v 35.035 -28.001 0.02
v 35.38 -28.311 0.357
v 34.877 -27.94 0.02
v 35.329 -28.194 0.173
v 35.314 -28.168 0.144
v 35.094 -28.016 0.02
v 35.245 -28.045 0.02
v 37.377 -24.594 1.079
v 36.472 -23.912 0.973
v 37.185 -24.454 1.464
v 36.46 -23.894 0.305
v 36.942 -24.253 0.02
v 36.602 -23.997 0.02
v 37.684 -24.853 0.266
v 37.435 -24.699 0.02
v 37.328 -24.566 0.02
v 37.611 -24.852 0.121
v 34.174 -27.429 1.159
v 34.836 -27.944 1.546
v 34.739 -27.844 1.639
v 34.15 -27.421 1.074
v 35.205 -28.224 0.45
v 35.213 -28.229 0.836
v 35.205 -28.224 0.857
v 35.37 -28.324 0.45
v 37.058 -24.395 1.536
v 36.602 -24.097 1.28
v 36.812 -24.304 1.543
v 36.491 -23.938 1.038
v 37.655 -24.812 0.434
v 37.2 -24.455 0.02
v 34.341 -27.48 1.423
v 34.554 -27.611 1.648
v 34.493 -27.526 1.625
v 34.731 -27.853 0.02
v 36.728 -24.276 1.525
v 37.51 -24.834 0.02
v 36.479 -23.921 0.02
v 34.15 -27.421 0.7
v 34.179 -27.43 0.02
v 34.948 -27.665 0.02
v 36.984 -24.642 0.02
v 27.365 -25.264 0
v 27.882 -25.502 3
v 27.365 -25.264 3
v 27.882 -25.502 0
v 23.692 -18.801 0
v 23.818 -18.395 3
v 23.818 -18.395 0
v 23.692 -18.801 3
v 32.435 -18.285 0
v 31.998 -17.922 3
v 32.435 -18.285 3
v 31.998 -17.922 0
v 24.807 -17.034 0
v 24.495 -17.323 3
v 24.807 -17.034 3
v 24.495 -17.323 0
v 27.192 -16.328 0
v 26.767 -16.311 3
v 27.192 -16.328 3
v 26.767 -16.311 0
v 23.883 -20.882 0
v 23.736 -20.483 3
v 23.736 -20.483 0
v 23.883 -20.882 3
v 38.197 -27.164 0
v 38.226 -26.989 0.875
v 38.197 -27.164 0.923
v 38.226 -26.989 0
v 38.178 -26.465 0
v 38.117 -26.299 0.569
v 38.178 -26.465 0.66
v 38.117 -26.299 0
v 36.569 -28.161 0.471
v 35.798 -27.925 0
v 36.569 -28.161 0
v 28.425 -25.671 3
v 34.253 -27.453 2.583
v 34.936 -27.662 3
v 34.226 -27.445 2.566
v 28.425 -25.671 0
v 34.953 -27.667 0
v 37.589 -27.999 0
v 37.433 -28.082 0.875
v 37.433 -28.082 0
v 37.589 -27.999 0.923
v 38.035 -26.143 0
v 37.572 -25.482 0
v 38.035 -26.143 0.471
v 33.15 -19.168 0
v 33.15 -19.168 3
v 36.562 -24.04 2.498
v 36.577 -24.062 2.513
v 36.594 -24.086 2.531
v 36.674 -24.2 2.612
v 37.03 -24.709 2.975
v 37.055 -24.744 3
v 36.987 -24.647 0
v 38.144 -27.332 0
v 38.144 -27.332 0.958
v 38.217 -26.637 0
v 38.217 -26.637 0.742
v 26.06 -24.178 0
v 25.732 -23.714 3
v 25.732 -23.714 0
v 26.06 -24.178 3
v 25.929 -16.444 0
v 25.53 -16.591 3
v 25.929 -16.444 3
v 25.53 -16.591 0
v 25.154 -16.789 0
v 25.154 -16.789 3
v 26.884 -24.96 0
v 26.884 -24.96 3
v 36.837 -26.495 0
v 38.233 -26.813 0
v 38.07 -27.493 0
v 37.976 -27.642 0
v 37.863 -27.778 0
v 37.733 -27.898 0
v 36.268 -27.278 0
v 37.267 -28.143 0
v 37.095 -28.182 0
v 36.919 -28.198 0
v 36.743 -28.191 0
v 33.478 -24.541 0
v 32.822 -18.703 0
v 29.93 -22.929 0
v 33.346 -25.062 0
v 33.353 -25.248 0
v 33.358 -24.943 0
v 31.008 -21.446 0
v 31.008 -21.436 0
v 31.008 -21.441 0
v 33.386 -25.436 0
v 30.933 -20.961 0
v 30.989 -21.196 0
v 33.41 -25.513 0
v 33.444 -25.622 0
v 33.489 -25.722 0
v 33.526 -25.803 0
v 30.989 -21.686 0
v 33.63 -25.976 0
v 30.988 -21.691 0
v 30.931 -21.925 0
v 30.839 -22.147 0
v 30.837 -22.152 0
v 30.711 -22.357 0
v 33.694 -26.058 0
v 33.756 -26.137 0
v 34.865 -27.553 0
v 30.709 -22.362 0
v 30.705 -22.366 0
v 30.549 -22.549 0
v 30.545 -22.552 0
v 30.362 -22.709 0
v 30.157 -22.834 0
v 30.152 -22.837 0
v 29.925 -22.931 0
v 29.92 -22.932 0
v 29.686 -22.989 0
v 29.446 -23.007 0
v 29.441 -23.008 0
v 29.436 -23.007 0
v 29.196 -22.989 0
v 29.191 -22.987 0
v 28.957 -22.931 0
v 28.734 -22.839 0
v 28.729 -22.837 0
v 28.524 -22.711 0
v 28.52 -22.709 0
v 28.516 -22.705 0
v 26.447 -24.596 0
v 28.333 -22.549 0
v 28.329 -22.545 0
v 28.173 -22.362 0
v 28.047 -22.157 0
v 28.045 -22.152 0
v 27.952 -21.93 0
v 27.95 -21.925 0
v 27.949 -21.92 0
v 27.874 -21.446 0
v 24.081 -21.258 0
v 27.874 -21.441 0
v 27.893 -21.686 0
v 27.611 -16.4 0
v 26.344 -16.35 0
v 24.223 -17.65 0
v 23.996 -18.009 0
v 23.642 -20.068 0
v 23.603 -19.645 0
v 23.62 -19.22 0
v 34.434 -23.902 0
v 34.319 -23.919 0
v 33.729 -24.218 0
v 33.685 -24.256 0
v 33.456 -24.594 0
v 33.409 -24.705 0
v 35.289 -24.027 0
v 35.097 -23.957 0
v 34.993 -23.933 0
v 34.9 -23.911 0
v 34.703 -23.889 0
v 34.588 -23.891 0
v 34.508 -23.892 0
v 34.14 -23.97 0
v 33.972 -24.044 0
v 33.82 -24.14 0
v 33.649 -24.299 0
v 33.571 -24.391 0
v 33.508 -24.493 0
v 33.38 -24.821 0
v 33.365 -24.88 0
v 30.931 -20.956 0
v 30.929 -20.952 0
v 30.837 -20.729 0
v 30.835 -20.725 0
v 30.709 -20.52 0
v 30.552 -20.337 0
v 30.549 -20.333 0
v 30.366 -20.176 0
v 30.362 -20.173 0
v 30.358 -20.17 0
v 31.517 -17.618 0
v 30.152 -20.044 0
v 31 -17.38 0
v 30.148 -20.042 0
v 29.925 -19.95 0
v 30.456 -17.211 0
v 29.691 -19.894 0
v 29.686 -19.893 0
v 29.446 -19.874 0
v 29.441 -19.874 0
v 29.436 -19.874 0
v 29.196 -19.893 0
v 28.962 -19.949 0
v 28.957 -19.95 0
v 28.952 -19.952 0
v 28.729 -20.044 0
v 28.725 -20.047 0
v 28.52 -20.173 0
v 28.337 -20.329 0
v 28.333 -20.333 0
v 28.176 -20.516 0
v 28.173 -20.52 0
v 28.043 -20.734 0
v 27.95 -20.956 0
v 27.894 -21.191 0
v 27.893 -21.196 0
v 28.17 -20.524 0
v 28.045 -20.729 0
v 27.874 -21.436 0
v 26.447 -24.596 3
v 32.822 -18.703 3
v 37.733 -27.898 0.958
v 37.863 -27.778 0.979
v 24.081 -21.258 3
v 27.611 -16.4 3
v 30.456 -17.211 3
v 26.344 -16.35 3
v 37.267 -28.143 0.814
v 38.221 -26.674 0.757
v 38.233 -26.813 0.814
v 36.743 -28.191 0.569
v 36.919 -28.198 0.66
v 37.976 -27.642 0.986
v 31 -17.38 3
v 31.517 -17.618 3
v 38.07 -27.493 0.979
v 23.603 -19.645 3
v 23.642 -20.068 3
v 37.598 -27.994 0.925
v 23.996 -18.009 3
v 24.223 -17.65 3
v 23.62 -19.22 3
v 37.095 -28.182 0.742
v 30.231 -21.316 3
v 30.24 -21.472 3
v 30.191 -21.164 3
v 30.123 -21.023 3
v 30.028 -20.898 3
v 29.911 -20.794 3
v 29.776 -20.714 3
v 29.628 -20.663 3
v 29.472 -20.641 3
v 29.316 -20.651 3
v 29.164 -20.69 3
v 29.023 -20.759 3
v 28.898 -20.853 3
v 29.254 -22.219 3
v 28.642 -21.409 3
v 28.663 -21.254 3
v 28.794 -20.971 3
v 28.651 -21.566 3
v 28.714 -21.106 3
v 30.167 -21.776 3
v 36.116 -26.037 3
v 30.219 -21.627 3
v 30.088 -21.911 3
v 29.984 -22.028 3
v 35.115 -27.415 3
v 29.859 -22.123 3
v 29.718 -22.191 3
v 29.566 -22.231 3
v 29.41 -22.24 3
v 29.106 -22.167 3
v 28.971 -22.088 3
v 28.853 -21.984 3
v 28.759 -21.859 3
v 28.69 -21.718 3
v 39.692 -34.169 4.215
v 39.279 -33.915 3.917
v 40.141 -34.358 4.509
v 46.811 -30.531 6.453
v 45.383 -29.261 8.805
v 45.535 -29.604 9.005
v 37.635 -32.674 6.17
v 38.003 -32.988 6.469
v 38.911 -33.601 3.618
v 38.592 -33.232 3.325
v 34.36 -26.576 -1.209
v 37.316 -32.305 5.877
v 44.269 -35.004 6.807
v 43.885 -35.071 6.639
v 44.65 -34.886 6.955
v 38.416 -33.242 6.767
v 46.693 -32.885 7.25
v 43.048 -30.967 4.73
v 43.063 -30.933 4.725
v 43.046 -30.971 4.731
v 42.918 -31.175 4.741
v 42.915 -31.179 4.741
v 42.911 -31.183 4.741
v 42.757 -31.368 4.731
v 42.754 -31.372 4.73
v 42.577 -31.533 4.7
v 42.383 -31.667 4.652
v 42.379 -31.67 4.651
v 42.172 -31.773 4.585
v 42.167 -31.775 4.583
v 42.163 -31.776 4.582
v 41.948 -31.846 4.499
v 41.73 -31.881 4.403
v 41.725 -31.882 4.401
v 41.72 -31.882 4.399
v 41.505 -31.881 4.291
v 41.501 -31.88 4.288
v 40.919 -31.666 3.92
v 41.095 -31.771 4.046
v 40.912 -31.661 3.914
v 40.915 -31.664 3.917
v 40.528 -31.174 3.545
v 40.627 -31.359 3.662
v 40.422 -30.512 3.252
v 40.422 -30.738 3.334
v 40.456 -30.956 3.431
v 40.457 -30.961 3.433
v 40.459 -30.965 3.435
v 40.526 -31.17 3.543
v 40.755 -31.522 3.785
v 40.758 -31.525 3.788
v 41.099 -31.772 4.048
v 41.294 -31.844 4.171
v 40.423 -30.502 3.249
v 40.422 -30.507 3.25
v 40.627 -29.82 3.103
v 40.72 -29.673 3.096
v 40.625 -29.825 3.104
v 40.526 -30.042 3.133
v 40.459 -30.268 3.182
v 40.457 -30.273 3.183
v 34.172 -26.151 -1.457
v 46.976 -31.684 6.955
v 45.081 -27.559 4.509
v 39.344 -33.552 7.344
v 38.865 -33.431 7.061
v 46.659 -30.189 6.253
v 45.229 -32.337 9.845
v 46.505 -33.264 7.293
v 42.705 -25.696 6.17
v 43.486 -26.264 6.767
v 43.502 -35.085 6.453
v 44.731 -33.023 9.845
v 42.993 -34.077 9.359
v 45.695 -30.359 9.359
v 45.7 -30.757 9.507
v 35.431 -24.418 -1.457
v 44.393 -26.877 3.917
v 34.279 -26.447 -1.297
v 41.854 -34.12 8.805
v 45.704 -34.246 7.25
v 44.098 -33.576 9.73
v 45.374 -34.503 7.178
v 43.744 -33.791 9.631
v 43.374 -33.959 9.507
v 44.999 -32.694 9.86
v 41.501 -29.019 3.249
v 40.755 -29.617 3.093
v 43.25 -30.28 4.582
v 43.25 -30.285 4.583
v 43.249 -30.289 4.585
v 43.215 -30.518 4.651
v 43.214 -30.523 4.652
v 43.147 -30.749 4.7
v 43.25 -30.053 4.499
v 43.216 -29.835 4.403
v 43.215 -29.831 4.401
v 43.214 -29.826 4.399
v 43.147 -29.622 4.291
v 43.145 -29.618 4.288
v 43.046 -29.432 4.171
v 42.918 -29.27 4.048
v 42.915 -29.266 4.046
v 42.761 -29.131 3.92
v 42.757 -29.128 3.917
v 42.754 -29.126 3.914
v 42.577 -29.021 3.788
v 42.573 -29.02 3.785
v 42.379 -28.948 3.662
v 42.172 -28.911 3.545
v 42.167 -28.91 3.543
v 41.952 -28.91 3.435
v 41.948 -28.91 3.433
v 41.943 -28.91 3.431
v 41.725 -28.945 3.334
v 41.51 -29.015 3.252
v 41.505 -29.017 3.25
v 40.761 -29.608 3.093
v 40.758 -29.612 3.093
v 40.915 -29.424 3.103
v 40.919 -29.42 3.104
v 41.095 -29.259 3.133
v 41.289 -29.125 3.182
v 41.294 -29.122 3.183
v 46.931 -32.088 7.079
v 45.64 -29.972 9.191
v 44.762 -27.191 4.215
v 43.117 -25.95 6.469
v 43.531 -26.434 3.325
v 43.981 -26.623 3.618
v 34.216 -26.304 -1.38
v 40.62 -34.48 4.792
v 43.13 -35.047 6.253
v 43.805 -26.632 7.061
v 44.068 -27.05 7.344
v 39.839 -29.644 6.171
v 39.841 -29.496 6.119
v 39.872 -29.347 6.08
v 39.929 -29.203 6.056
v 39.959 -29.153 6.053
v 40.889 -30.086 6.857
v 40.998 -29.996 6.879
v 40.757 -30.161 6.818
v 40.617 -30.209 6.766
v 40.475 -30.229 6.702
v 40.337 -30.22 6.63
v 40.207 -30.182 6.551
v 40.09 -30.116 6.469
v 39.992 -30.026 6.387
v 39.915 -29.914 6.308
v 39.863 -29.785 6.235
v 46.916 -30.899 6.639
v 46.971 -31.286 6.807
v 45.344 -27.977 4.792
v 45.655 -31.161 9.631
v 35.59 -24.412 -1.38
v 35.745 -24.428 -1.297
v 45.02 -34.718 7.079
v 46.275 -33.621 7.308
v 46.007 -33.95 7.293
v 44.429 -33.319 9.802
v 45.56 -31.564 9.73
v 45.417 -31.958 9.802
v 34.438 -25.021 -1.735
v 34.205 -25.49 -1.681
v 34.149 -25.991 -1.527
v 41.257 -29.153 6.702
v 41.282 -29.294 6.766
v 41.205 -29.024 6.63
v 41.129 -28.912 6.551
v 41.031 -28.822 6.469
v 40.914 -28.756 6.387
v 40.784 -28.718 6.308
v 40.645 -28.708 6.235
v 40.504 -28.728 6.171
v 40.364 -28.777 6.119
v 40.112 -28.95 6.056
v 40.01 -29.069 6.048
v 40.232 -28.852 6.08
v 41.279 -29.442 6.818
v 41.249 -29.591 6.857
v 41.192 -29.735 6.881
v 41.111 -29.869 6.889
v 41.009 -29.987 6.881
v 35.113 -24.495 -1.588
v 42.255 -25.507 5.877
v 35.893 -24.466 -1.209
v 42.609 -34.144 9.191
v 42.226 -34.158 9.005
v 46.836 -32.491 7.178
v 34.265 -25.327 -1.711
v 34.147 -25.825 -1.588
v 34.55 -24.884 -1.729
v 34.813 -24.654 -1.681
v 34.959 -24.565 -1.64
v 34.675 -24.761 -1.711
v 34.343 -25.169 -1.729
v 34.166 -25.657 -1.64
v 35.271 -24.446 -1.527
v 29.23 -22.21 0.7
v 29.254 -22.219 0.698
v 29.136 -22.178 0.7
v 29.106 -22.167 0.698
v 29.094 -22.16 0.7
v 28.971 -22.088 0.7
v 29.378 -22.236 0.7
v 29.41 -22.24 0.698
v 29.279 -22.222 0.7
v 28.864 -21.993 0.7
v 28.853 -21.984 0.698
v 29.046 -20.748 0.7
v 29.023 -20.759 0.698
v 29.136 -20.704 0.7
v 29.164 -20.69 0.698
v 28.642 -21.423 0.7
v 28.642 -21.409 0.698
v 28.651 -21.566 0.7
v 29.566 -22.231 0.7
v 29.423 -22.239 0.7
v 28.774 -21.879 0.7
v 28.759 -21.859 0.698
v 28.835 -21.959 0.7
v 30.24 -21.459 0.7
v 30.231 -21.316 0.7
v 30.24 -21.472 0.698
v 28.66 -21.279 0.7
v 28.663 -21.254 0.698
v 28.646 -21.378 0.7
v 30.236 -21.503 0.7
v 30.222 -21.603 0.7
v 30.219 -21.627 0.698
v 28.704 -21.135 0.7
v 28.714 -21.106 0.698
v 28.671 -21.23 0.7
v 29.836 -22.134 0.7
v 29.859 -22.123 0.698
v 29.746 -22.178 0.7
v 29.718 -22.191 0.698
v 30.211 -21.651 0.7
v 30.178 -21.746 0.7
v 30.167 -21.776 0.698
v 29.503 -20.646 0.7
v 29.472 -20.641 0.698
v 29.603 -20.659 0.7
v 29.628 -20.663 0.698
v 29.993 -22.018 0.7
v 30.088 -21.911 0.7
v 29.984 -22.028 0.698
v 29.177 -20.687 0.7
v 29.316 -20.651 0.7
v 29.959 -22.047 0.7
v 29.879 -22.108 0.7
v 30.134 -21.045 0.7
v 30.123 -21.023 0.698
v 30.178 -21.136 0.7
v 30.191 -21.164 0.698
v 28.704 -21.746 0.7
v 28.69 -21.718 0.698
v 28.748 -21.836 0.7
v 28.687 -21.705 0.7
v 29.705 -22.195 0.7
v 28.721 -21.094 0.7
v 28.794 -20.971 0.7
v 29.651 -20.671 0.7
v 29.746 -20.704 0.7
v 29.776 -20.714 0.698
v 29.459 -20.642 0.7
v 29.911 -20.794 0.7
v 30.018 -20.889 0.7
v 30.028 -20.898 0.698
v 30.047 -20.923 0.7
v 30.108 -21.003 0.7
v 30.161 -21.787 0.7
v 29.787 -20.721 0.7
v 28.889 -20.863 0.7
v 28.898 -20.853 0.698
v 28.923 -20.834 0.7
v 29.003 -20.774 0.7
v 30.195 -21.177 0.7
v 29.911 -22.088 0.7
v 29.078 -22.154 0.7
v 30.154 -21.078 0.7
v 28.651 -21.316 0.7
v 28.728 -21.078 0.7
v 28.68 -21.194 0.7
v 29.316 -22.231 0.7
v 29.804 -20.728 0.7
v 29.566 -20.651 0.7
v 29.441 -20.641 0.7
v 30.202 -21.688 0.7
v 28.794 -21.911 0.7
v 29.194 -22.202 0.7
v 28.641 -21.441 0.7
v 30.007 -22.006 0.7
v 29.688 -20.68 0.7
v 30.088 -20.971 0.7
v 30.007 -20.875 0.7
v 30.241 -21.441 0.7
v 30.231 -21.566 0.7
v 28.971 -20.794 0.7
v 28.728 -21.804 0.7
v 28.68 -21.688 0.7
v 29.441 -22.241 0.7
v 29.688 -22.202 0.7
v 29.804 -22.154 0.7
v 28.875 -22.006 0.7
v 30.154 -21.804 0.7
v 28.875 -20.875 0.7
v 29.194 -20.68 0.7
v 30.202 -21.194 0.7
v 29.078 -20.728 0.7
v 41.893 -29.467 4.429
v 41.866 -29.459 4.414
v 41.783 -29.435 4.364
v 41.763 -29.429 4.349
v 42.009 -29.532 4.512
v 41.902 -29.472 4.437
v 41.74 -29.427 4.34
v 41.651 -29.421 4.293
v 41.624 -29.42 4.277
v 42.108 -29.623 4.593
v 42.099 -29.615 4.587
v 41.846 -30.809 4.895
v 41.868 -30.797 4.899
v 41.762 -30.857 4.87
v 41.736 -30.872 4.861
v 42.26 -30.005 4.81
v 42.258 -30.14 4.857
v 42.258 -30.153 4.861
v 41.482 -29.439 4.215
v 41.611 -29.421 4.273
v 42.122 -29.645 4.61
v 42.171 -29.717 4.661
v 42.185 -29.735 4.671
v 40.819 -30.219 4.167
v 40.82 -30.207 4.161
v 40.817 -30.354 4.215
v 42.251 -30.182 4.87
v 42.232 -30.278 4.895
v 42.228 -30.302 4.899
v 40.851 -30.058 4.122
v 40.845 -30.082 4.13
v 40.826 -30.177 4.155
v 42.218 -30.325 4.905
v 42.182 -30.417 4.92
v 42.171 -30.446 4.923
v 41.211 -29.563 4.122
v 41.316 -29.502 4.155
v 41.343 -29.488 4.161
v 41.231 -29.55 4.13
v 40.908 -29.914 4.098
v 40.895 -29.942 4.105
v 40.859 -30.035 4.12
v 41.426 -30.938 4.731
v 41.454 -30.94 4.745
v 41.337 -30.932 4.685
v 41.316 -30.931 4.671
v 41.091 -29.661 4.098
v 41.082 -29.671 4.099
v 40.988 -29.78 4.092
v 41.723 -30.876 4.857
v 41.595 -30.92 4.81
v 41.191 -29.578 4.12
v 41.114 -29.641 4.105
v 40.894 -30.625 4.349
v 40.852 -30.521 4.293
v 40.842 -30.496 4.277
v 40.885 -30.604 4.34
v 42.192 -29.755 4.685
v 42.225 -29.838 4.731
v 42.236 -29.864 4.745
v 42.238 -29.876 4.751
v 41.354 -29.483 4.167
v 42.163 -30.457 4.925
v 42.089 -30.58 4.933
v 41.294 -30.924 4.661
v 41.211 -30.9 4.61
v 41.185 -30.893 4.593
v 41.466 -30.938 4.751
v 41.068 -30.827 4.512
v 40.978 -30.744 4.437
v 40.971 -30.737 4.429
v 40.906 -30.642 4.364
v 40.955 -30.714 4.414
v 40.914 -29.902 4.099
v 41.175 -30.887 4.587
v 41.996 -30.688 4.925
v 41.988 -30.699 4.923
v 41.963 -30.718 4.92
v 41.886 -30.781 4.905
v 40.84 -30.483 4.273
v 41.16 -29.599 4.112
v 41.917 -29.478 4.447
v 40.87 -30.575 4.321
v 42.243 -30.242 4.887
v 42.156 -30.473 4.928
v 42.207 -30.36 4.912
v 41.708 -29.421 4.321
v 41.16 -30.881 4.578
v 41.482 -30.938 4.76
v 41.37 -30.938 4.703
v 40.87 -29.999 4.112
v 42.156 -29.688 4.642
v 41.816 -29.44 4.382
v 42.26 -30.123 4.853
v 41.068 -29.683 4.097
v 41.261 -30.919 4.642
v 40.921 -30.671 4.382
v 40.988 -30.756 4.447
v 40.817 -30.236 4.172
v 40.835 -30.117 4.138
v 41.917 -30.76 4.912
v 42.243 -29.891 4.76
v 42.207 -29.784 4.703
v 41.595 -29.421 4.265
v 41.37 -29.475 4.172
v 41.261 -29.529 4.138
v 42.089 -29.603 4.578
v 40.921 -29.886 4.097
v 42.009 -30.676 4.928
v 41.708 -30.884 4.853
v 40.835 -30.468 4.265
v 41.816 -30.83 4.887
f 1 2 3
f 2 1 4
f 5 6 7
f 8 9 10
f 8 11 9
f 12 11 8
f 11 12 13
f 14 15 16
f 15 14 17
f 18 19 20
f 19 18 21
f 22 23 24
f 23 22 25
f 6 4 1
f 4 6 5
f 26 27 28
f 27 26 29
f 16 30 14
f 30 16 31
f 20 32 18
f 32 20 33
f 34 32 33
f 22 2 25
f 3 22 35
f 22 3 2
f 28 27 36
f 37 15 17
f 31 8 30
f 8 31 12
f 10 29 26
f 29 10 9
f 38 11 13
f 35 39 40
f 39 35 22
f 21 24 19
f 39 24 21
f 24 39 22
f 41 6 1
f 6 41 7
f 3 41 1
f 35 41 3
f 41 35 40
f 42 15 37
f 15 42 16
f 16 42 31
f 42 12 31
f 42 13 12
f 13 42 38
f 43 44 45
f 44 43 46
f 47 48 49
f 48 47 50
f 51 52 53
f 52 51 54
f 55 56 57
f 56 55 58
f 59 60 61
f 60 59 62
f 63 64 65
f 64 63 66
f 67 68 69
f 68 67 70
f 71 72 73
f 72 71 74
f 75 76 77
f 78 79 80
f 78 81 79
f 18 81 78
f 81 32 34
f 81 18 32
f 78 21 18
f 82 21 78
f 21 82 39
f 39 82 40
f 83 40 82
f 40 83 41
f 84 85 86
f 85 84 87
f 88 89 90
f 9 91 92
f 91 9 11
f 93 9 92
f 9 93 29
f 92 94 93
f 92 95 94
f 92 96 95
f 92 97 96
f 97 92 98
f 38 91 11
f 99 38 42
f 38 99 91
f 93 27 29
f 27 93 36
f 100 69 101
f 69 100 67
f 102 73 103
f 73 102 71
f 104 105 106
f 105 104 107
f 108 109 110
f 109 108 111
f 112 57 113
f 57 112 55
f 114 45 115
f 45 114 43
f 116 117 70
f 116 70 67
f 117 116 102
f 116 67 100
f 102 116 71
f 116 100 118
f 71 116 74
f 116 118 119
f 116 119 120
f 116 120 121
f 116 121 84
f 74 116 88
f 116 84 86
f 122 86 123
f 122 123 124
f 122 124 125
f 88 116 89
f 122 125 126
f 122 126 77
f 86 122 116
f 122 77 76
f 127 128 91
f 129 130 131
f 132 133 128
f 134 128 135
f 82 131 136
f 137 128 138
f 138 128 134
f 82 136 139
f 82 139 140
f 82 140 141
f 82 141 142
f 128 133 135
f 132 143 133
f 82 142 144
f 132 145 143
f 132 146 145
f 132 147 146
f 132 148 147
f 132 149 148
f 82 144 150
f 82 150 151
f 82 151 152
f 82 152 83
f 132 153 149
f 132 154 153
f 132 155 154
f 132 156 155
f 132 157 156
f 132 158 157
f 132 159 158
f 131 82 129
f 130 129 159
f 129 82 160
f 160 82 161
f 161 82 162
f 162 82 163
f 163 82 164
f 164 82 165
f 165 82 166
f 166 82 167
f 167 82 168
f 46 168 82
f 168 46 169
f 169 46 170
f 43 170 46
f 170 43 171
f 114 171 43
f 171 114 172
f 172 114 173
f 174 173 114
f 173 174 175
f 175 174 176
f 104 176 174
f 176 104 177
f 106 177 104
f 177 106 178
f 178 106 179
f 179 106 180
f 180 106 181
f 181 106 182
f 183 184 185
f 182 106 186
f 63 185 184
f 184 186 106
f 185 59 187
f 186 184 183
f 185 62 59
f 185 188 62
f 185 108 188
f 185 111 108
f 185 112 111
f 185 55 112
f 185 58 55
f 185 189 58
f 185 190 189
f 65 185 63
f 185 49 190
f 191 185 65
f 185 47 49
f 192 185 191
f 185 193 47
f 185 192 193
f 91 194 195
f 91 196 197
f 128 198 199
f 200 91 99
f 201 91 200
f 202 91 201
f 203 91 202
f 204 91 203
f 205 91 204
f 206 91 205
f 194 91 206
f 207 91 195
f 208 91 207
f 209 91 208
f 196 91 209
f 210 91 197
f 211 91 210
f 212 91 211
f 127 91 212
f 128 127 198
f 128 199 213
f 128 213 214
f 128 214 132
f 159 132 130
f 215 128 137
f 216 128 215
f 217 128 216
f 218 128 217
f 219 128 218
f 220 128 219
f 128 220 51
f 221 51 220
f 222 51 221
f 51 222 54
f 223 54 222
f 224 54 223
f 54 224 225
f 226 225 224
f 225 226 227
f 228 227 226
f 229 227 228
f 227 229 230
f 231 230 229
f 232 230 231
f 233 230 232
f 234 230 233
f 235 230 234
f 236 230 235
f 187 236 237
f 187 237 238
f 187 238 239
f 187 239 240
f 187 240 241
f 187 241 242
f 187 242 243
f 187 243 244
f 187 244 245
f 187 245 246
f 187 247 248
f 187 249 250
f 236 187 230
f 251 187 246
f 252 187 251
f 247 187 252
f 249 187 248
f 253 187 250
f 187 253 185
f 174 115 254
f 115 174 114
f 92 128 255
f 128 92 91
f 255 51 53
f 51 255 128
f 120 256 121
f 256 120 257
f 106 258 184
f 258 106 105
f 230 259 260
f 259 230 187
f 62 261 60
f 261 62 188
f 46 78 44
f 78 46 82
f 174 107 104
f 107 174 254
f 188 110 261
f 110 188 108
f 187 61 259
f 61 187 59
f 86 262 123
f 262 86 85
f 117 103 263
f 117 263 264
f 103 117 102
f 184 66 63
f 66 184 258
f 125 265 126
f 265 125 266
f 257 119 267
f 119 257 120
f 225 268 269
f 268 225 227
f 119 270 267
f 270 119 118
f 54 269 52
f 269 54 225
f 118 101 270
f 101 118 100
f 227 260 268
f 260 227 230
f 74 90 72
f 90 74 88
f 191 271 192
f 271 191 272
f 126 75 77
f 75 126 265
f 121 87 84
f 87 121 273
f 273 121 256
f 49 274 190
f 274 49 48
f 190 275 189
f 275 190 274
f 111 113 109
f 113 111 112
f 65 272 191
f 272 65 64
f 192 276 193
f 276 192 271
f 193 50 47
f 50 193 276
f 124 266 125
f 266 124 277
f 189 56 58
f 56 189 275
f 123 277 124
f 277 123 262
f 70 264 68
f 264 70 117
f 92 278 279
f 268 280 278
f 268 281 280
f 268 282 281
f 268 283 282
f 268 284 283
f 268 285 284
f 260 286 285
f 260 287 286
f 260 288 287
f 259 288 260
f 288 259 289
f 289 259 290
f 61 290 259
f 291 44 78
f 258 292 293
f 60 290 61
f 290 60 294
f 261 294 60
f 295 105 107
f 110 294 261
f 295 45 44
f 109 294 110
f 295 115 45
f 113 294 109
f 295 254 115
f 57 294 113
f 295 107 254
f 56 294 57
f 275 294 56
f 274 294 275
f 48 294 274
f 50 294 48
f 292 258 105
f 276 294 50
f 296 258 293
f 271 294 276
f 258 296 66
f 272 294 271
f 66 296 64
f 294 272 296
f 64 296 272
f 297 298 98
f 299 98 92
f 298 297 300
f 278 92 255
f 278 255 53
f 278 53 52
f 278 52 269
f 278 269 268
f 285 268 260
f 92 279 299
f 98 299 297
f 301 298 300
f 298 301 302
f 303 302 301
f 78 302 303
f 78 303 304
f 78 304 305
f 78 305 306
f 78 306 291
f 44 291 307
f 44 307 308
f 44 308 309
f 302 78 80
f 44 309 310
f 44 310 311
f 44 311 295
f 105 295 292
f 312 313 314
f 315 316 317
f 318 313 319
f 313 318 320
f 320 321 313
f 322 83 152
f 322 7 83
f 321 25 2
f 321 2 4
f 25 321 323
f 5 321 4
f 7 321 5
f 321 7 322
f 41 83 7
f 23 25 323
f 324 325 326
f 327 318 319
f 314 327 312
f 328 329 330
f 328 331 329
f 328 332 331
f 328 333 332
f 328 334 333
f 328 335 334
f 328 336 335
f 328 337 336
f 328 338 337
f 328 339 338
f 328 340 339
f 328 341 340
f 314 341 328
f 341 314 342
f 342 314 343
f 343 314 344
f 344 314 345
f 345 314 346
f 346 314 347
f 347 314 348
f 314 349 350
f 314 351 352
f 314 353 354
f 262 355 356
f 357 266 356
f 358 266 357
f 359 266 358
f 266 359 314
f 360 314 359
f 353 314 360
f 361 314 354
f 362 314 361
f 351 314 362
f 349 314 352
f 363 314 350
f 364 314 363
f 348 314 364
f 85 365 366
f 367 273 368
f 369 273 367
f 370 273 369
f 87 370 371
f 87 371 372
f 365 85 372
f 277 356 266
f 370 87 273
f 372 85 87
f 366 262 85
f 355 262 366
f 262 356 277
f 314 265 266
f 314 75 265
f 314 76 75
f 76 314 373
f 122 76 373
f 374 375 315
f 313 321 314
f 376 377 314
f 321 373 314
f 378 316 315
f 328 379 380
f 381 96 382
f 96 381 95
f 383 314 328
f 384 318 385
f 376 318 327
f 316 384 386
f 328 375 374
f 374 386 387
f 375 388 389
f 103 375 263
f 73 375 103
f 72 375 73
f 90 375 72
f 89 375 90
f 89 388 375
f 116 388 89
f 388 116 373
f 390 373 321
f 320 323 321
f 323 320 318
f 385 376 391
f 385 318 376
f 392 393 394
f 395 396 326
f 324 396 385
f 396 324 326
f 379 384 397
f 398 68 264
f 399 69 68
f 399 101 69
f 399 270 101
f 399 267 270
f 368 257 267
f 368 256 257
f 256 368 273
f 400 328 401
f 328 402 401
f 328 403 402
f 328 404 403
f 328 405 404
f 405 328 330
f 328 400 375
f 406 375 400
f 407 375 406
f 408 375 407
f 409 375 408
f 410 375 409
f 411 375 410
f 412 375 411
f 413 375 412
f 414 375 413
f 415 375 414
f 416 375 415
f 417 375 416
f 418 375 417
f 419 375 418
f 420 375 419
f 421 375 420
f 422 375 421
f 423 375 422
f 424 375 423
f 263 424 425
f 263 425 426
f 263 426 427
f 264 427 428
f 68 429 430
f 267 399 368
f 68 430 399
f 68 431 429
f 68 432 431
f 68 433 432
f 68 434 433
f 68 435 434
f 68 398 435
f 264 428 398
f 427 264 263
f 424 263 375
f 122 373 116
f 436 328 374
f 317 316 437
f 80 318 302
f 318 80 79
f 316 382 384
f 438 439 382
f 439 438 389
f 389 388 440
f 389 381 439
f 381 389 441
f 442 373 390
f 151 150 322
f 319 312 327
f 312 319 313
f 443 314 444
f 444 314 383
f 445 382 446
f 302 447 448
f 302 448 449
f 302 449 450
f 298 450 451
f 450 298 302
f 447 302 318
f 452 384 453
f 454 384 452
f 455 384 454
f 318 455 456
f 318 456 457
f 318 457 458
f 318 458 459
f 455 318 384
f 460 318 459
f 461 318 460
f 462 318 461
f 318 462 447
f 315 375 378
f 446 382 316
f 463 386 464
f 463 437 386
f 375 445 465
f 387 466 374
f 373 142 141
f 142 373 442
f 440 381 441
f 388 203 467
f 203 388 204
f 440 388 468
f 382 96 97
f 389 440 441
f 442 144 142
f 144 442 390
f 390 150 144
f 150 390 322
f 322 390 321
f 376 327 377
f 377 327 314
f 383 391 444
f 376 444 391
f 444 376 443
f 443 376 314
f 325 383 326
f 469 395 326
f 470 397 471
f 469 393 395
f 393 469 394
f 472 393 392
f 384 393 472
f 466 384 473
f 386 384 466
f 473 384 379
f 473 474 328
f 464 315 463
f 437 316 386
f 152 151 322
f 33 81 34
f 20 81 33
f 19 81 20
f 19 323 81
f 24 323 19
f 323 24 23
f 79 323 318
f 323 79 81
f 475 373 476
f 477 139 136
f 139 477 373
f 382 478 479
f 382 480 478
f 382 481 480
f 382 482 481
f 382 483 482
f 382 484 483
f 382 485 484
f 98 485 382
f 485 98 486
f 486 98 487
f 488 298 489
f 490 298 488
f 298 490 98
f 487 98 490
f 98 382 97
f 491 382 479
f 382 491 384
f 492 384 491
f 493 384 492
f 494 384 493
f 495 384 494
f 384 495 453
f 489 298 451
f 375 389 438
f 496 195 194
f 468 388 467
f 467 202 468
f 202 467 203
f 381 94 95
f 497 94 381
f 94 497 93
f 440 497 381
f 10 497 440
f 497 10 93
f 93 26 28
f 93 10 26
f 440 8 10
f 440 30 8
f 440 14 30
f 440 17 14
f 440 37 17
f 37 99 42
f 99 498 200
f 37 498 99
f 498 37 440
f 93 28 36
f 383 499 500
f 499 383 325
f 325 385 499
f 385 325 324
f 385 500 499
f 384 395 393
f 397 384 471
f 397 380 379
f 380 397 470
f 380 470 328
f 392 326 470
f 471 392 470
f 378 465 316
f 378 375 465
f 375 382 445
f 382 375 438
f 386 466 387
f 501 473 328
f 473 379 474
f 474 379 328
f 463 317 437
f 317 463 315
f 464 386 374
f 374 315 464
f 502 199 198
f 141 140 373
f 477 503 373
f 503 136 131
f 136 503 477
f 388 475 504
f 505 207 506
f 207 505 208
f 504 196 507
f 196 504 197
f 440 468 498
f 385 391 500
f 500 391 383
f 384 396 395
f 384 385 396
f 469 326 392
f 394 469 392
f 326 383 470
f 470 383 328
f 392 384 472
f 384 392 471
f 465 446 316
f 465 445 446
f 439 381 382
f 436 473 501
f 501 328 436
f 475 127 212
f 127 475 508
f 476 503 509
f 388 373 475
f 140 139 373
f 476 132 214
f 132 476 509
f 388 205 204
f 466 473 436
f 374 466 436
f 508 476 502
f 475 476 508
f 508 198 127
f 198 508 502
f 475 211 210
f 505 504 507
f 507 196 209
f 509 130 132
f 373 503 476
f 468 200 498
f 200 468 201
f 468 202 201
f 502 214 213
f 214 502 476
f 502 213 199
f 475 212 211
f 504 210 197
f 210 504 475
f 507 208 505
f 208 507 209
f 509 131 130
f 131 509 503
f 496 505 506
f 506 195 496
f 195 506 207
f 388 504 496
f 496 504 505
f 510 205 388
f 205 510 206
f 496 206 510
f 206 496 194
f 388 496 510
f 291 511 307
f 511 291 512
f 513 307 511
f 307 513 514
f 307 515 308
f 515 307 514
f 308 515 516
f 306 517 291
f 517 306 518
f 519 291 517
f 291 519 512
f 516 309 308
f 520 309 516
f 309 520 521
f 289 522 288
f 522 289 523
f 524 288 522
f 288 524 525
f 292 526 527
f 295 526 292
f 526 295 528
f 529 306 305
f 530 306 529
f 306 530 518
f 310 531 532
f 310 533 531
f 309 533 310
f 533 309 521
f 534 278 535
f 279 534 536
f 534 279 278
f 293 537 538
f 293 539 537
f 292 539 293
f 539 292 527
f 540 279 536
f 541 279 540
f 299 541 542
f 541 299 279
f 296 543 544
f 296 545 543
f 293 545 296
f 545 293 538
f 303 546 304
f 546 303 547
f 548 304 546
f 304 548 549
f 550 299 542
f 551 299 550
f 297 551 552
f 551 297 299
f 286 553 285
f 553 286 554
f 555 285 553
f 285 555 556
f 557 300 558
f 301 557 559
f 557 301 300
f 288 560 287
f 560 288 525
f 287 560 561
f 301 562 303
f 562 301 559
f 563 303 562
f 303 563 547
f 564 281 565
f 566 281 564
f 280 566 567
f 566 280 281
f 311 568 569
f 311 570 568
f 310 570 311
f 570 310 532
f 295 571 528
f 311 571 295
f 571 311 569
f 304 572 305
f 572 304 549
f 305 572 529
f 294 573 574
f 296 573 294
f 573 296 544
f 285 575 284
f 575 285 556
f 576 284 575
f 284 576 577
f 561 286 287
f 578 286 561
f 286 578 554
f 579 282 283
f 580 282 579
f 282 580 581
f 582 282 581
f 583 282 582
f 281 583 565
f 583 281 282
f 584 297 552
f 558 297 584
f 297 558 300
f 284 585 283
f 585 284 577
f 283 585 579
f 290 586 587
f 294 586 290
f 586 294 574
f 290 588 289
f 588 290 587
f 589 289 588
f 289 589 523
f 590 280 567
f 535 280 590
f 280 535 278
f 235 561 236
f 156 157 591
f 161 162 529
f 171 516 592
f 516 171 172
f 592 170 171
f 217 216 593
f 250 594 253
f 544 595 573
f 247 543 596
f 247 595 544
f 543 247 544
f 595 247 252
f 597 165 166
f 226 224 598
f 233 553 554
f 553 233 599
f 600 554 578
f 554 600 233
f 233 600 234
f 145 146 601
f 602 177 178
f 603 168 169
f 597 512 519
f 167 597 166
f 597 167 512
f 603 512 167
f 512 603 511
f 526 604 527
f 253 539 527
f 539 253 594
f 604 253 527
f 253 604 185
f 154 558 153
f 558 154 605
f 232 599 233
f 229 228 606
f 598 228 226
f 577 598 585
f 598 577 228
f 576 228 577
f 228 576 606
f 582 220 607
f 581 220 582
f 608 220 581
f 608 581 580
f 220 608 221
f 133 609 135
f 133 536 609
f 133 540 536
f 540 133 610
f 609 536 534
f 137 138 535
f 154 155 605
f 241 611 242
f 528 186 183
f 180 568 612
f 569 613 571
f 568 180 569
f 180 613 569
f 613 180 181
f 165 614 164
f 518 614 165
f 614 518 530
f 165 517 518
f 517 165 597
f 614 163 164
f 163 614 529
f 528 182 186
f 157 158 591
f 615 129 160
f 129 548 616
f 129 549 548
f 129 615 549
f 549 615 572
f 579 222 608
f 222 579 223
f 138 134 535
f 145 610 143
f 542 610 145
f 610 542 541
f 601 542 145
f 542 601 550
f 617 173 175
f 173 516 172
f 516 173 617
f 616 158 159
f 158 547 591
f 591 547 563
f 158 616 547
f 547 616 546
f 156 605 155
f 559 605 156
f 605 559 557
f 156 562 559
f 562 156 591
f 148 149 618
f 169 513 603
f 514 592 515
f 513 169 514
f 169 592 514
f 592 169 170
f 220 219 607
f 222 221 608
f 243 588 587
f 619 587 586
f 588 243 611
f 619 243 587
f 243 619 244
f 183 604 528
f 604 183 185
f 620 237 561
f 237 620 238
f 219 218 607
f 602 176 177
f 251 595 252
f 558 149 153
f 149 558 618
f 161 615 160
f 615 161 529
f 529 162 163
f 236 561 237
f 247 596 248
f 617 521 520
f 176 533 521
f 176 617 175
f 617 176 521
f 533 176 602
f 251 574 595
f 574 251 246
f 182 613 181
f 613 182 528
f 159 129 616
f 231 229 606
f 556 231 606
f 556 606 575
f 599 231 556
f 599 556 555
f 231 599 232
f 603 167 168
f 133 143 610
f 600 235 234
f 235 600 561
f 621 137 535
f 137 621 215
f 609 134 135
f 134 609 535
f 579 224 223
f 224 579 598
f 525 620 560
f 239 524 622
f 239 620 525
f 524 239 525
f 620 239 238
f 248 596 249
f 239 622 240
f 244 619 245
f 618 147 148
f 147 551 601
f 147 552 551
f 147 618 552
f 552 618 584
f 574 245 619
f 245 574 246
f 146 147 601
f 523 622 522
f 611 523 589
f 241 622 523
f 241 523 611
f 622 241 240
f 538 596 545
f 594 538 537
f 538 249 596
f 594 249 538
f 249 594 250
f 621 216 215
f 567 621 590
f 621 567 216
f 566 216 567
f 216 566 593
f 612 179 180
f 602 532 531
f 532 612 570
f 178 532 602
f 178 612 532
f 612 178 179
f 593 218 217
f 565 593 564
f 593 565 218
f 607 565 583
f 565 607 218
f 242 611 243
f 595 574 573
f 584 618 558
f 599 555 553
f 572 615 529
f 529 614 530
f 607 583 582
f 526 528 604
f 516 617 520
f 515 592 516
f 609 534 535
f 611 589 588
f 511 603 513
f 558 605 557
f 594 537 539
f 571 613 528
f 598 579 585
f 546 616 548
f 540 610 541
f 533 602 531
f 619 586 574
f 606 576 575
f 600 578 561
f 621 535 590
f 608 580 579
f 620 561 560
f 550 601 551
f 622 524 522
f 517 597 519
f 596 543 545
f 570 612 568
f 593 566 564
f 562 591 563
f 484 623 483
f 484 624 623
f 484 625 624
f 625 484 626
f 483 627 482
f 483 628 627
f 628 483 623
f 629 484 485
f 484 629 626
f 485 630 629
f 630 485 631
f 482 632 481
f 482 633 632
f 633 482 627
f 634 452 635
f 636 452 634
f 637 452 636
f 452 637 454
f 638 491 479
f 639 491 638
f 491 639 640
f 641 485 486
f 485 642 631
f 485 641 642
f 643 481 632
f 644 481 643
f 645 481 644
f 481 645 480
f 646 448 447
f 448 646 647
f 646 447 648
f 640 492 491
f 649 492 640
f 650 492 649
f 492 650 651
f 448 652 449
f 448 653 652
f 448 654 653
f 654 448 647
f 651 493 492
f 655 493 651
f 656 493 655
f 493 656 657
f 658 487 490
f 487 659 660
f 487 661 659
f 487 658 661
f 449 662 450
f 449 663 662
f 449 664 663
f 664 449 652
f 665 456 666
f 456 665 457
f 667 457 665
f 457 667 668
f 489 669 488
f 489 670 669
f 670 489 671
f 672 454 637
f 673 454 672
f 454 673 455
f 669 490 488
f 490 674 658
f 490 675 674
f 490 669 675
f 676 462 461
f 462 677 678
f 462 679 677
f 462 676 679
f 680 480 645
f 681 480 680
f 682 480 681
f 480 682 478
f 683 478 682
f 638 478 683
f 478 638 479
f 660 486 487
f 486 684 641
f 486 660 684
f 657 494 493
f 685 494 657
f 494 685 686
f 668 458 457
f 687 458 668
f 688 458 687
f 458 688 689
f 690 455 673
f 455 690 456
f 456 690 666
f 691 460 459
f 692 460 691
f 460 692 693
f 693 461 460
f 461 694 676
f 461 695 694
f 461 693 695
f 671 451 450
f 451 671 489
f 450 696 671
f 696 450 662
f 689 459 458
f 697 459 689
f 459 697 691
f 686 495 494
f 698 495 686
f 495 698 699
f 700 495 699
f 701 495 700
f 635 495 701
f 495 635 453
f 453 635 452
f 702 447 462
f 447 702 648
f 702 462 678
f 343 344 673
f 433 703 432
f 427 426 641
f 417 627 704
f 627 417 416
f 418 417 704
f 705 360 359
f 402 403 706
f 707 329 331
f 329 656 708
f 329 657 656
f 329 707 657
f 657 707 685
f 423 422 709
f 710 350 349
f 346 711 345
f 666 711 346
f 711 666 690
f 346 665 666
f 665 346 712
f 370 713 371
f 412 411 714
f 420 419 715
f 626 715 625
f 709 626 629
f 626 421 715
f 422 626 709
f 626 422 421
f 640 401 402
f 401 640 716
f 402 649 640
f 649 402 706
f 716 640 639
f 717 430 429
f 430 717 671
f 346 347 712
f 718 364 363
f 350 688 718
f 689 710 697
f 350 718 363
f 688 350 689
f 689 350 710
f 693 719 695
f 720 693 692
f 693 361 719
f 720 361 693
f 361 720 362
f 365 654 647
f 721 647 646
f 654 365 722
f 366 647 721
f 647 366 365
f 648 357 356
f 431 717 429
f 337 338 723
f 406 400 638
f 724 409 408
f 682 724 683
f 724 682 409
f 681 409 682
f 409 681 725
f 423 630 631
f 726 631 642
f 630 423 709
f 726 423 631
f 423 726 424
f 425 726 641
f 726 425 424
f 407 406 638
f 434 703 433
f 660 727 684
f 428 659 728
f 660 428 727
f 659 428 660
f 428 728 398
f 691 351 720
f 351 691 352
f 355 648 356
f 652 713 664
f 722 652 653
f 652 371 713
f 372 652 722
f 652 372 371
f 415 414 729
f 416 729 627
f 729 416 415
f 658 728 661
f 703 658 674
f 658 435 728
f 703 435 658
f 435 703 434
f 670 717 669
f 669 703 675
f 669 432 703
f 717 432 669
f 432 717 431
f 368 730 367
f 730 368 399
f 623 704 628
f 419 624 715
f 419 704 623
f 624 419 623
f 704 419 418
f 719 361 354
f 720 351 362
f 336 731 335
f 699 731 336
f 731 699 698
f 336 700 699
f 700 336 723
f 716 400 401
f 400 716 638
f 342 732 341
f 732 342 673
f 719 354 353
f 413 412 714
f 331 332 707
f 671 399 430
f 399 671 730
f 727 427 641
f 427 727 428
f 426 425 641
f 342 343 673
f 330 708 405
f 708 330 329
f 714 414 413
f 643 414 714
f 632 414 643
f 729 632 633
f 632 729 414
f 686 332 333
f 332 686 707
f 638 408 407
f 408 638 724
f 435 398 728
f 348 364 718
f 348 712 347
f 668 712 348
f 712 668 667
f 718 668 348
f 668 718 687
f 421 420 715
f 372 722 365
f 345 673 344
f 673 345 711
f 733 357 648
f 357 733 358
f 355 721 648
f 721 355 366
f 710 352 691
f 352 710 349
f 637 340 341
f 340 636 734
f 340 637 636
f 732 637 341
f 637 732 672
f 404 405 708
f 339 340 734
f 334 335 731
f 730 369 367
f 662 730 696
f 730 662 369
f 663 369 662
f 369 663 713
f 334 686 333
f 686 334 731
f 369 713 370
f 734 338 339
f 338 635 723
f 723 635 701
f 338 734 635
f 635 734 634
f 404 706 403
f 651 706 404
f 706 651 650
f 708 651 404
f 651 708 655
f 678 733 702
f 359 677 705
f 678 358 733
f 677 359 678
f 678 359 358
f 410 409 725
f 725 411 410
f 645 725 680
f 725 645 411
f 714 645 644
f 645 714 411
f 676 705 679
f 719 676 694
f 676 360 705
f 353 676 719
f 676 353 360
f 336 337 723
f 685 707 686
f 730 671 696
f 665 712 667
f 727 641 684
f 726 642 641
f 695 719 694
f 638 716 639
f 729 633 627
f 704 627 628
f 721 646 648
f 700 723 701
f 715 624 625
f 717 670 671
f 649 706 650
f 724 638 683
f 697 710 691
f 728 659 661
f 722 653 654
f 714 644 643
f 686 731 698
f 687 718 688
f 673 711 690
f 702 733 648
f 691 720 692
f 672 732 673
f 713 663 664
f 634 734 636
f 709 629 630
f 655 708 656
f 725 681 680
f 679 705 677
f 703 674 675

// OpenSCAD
/*
  RHOMBICOSIDODECAHEDRON — ROUNDED 2-PANEL MIDDLE-HOLE CONNECTOR V2
  ==================================================================

  PURPOSE
  -------
  Separate two-screw connector used with the pentagon U-frame.

  It joins:
    1. the TOP-MIDDLE hole of the added centre 65 x 66 mm LED panel
    2. the MIDDLE hole of the neighbouring 66 mm edge outer LED panel

  The shape deliberately matches the rounded/tapered connector language used
  on the proven panel connectors: two rounded screw bosses taper toward the
  shared edge and are joined by a compact rounded hinge/web.

  IMPORTANT GEOMETRY
  ------------------
  The centre LED panel lies parallel to the pentagon face.
  The neighbouring outer LED panel is tilted by the exact
  rhombicosidodecahedron square/pentagon angle.

  Angle between the two PCB planes (small fold angle): 31.717474 deg
  Corresponding inside dihedral angle:                  148.282526 deg

  The hole positions are copied from the current U-frame/bridge geometry, so
  this part connects the two already-established middle-hole locations without
  changing either PCB position.

  SCREWS
  ------
  - M2
  - 1.60 mm through pilot
  - 3.20 mm x 0.70 mm conical lead-in on the PCB-facing side
  - 3.0 mm connector thickness, so longer screws may protrude inward

  MODES
  -----
  mode = "print"     centre-panel pad flat on the build plate
  mode = "assembly"  connector + both PCB previews
  mode = "part"      connector in installed coordinates

  PRINT QUANTITY
  --------------
  11 for the current sculpture; the north-pole pentagon remains open.
*/

$fn = 48;


// ============================================================================
// OUTPUT
// ============================================================================

mode = "print"; // "print", "assembly", "part"

print_quantity = 11;


// ============================================================================
// PCB / SCREW PARAMETERS
// ============================================================================

panel_thickness = 0.80;

pilot_hole_d = 1.60;

screw_leadin_d = 3.20;

screw_leadin_depth = 0.70;

pad_thickness = 3.00;


// Rounded connector proportions — based on the proven connector family.

pad_tip_r = 1.35;

pad_hole_r = 4.35;

pad_tail_r = 3.25;

pad_tail_extra = 3.20;


// Extend the narrow nose slightly past the theoretical panel edge,
// helping the two halves join firmly at the fold.

pad_seam_overlap = 1.20;


// Small internal rounded bridge joining the two noses.

web_radius = 2.10;

web_embed_from_surface = 0.45;

web_thickness = 1.35;


// Preview only.

pcb_hole_d_preview = 2.8;


// CSG tolerances.

eps = 0.03;

clip_size = 240;


// ============================================================================
// CURRENT U-FRAME CENTRE PANEL POSE
// ============================================================================

center_panel_w = 66.0;

center_panel_h = 65.0;

center_panel_rotation = 234.0;

center_panel_offset_x =  9.62;

center_panel_offset_y = -7.04;

center_panel_recess = 0.70;


// PCB back plane of the centre panel.

center_support_z =
    center_panel_recess
    +
    panel_thickness;


// TOP-MIDDLE hole.

center_hole_edge_distance = 8.00;

center_middle_hole_x = 0.0;

center_hole_y =
    center_panel_h/2
    -
    center_hole_edge_distance;


// ============================================================================
// CURRENT OUTER PANEL MIDDLE-HOLE POSE
// ============================================================================

// Exact values from the proven pentagon geometry.

outer_hole_pos = [
    41.83628284,
   -30.39583865,
     5.41684114
];


outer_inward_normal = [
   -0.42532540,
    0.30901699,
    0.85065081
];


outer_edge_axis = [
    0.58778525,
    0.80901699,
    0.0
];


outer_panel_in_axis = [
    0.68819097,
   -0.50000000,
    0.52573111
];


// Existing 0.20 mm real-world fit correction.

outer_hole_edge_distance = 8.20;


// ============================================================================
// HELPERS
// ============================================================================

function dot3(a,b) =
    a[0]*b[0]
    +
    a[1]*b[1]
    +
    a[2]*b[2];


function cross3(a,b) = [
    a[1]*b[2] - a[2]*b[1],
    a[2]*b[0] - a[0]*b[2],
    a[0]*b[1] - a[1]*b[0]
];


function length3(a) =
    sqrt(
        dot3(a,a)
    );


function unit3(a) =
    a
    /
    length3(a);


function rot2(p,a) = [
    p[0]*cos(a)
    -
    p[1]*sin(a),

    p[0]*sin(a)
    +
    p[1]*cos(a)
];


module local_frame(
    origin,
    x_axis,
    y_axis,
    z_axis
) {

    multmatrix([
        [
            x_axis[0],
            y_axis[0],
            z_axis[0],
            origin[0]
        ],
        [
            x_axis[1],
            y_axis[1],
            z_axis[1],
            origin[1]
        ],
        [
            x_axis[2],
            y_axis[2],
            z_axis[2],
            origin[2]
        ],
        [0,0,0,1]
    ])

    children();
}


// ============================================================================
// CENTRE PANEL FRAME
// ============================================================================

center_x_axis = [
    cos(center_panel_rotation),
    sin(center_panel_rotation),
    0
];


// +Y points from the centre-panel hole toward its top/shared edge.

center_to_edge_axis = [
    -sin(center_panel_rotation),
     cos(center_panel_rotation),
     0
];


center_inward_normal = [
    0,
    0,
    1
];


center_hole_xy =
    rot2(
        [
            center_middle_hole_x,
            center_hole_y
        ],
        center_panel_rotation
    )
    +
    [
        center_panel_offset_x,
        center_panel_offset_y
    ];


center_hole_pos = [
    center_hole_xy[0],
    center_hole_xy[1],
    center_support_z
];


// ============================================================================
// OUTER PANEL FRAME
// ============================================================================

// outer_panel_in_axis points FROM edge INTO panel.
// Therefore negative points from hole TOWARD shared edge.

outer_to_edge_axis = [
    -outer_panel_in_axis[0],
    -outer_panel_in_axis[1],
    -outer_panel_in_axis[2]
];


outer_pad_x_axis =
    outer_edge_axis;


outer_pad_y_axis =
    outer_to_edge_axis;


outer_pad_z_axis =
    outer_inward_normal;


// ============================================================================
// ANGLE CHECK
// ============================================================================

fold_angle =
    acos(
        dot3(
            center_inward_normal,
            outer_inward_normal
        )
    );


inside_dihedral =
    180
    -
    fold_angle;


assert(
    abs(
        inside_dihedral
        -
        148.2825
    )
    <
    0.02,

    "Unexpected centre-to-outer panel dihedral angle"
);


assert(
    screw_leadin_d
    >
    pilot_hole_d,

    "Lead-in diameter must exceed pilot diameter"
);


assert(
    screw_leadin_depth > 0
    &&
    screw_leadin_depth < pad_thickness,

    "Lead-in depth must remain smaller than pad thickness"
);


// ============================================================================
// ROUNDED EDGE-CONNECTOR PAD
// ============================================================================

// Local pad coordinates:
//
// X = along panel edge
// Y = from hole toward shared edge
// Z = inward from PCB
//
// Hole centre is [0,0].

module rounded_edge_pad_2d(
    edge_distance
) {

    tip_y =
        edge_distance
        +
        pad_seam_overlap;


    tail_y =
        -pad_tail_extra;


    hull() {

        // Narrow rounded nose at shared edge.

        translate([
            0,
            tip_y
        ])

            circle(
                r=pad_tip_r
            );


        // Large rounded screw boss.

        translate([
            0,
            0
        ])

            circle(
                r=pad_hole_r
            );


        // Rounded tail toward panel centre.

        translate([
            0,
            tail_y
        ])

            circle(
                r=pad_tail_r
            );
    }
}


module pad_solid(
    origin,
    x_axis,
    y_axis,
    z_axis,
    edge_distance
) {

    local_frame(
        origin,
        x_axis,
        y_axis,
        z_axis
    )

        linear_extrude(
            height=pad_thickness,
            convexity=8
        )

            rounded_edge_pad_2d(
                edge_distance
            );
}


// ============================================================================
// CENTRE PAD
// ============================================================================

module center_pad() {

    pad_solid(
        center_hole_pos,
        center_x_axis,
        center_to_edge_axis,
        center_inward_normal,
        center_hole_edge_distance
    );
}


// ============================================================================
// OUTER PAD
// ============================================================================

module outer_pad() {

    pad_solid(
        outer_hole_pos,
        outer_pad_x_axis,
        outer_pad_y_axis,
        outer_pad_z_axis,
        outer_hole_edge_distance
    );
}


// ============================================================================
// COMPACT ROUNDED HINGE / WEB
// ============================================================================

module center_web_anchor() {

    p =
        center_hole_pos
        +
        (
            center_hole_edge_distance
            +
            pad_seam_overlap
            -
            0.55
        )
        *
        center_to_edge_axis;


    local_frame(
        p,
        center_x_axis,
        center_to_edge_axis,
        center_inward_normal
    )

        translate([
            0,
            0,
            web_embed_from_surface
        ])

            cylinder(
                r=web_radius,
                h=web_thickness,
                $fn=36
            );
}


module outer_web_anchor() {

    p =
        outer_hole_pos
        +
        (
            outer_hole_edge_distance
            +
            pad_seam_overlap
            -
            0.55
        )
        *
        outer_to_edge_axis;


    local_frame(
        p,
        outer_pad_x_axis,
        outer_pad_y_axis,
        outer_pad_z_axis
    )

        translate([
            0,
            0,
            web_embed_from_surface
        ])

            cylinder(
                r=web_radius,
                h=web_thickness,
                $fn=36
            );
}


module rounded_hinge_web_raw() {

    hull() {

        center_web_anchor();

        outer_web_anchor();
    }
}


// ============================================================================
// KEEP HINGE BEHIND BOTH PCBS
// ============================================================================

module center_inward_halfspace() {

    local_frame(
        center_hole_pos,
        center_x_axis,
        center_to_edge_axis,
        center_inward_normal
    )

        translate([
            -clip_size/2,
            -clip_size/2,
            0.02
        ])

            cube([
                clip_size,
                clip_size,
                clip_size
            ]);
}


module outer_inward_halfspace() {

    local_frame(
        outer_hole_pos,
        outer_pad_x_axis,
        outer_pad_y_axis,
        outer_pad_z_axis
    )

        translate([
            -clip_size/2,
            -clip_size/2,
            0.02
        ])

            cube([
                clip_size,
                clip_size,
                clip_size
            ]);
}


module rounded_hinge_web() {

    intersection() {

        rounded_hinge_web_raw();

        center_inward_halfspace();

        outer_inward_halfspace();
    }
}


// ============================================================================
// PILOT + LEAD-IN CUTTER
// ============================================================================

module hole_cutter(
    origin,
    x_axis,
    y_axis,
    z_axis
) {

    local_frame(
        origin,
        x_axis,
        y_axis,
        z_axis
    )

        union() {

            // 1.6 mm through-pilot.

            translate([
                0,
                0,
                -eps
            ])

                cylinder(
                    d=pilot_hole_d,
                    h=pad_thickness+2*eps,
                    $fn=32
                );


            // 3.2 -> 1.6 mm screw-finding funnel.

            translate([
                0,
                0,
                -eps
            ])

                cylinder(
                    h=screw_leadin_depth+eps,
                    d1=screw_leadin_d,
                    d2=pilot_hole_d,
                    $fn=40
                );
        }
}


module center_hole_cutter() {

    hole_cutter(
        center_hole_pos,
        center_x_axis,
        center_to_edge_axis,
        center_inward_normal
    );
}


module outer_hole_cutter() {

    hole_cutter(
        outer_hole_pos,
        outer_pad_x_axis,
        outer_pad_y_axis,
        outer_pad_z_axis
    );
}


// ============================================================================
// FINAL CONNECTOR
// ============================================================================

module connector_installed() {

    difference() {

        union() {

            center_pad();

            outer_pad();

            rounded_hinge_web();
        }


        center_hole_cutter();

        outer_hole_cutter();
    }
}


// ============================================================================
// CENTRE PANEL PREVIEW
// ============================================================================

module center_panel_preview() {

    translate([
        center_panel_offset_x,
        center_panel_offset_y,
        center_panel_recess
    ])

        rotate([
            0,
            0,
            center_panel_rotation
        ])

            translate([
                -center_panel_w/2,
                -center_panel_h/2,
                0
            ])

                difference() {

                    cube([
                        center_panel_w,
                        center_panel_h,
                        panel_thickness
                    ]);


                    translate([
                        center_panel_w/2,
                        center_panel_h
                        -
                        center_hole_edge_distance,
                        -eps
                    ])

                        cylinder(
                            d=pcb_hole_d_preview,
                            h=panel_thickness+2*eps,
                            $fn=28
                        );
                }
}


// ============================================================================
// OUTER PANEL PREVIEW
// ============================================================================

module outer_panel_preview() {

    local_frame(
        outer_hole_pos,
        outer_edge_axis,
        outer_panel_in_axis,
        outer_inward_normal
    )

        translate([
            -33,
            -outer_hole_edge_distance,
            -panel_thickness
        ])

            difference() {

                cube([
                    66,
                    65,
                    panel_thickness
                ]);


                translate([
                    33,
                    outer_hole_edge_distance,
                    -eps
                ])

                    cylinder(
                        d=pcb_hole_d_preview,
                        h=panel_thickness+2*eps,
                        $fn=28
                    );
            }
}


// ============================================================================
// PRINT ORIENTATION
// ============================================================================

module connector_for_print() {

    // Centre-panel seating surface flat on build plate.

    translate([
        0,
        0,
        -center_support_z
    ])

        connector_installed();
}


// ============================================================================
// GENERATED-ASSEMBLY API
// ============================================================================

// Stable unique name for composition with the U-frame. This is an alias of the
// proven installed-coordinate geometry and does not change the printable part.

module middle_panel_connector_part() {
    connector_installed();
}


// ============================================================================
// DIAGNOSTICS
// ============================================================================

echo(
    str(
        "Fold angle between PCB planes: ",
        fold_angle,
        " deg"
    )
);


echo(
    str(
        "Inside dihedral angle: ",
        inside_dihedral,
        " deg"
    )
);


echo(
    str(
        "Centre middle-hole position: ",
        center_hole_pos
    )
);


echo(
    str(
        "Outer middle-hole position: ",
        outer_hole_pos
    )
);


echo(
    str(
        "Centre hole -> edge distance: ",
        center_hole_edge_distance,
        " mm"
    )
);


echo(
    str(
        "Outer connector hole -> edge distance: ",
        outer_hole_edge_distance,
        " mm"
    )
);


echo(
    "Shape: rounded/tapered 2-panel edge connector"
);


echo(
    str(
        "Current sculpture print quantity: ",
        print_quantity
    )
);


// ============================================================================
// OUTPUT
// ============================================================================

if(mode == "print") {

    connector_for_print();

} else if(mode == "assembly") {

    color([
        0.88,
        0.18,
        0.48,
        1.0
    ])

        connector_installed();


    color([
        0.06,
        0.06,
        0.07,
        0.52
    ])

        center_panel_preview();


    color([
        0.10,
        0.10,
        0.11,
        0.52
    ])

        outer_panel_preview();

} else if(mode == "part") {

    connector_installed();

} else {

    assert(
        false,
        "mode must be print, assembly, or part"
    );
}
